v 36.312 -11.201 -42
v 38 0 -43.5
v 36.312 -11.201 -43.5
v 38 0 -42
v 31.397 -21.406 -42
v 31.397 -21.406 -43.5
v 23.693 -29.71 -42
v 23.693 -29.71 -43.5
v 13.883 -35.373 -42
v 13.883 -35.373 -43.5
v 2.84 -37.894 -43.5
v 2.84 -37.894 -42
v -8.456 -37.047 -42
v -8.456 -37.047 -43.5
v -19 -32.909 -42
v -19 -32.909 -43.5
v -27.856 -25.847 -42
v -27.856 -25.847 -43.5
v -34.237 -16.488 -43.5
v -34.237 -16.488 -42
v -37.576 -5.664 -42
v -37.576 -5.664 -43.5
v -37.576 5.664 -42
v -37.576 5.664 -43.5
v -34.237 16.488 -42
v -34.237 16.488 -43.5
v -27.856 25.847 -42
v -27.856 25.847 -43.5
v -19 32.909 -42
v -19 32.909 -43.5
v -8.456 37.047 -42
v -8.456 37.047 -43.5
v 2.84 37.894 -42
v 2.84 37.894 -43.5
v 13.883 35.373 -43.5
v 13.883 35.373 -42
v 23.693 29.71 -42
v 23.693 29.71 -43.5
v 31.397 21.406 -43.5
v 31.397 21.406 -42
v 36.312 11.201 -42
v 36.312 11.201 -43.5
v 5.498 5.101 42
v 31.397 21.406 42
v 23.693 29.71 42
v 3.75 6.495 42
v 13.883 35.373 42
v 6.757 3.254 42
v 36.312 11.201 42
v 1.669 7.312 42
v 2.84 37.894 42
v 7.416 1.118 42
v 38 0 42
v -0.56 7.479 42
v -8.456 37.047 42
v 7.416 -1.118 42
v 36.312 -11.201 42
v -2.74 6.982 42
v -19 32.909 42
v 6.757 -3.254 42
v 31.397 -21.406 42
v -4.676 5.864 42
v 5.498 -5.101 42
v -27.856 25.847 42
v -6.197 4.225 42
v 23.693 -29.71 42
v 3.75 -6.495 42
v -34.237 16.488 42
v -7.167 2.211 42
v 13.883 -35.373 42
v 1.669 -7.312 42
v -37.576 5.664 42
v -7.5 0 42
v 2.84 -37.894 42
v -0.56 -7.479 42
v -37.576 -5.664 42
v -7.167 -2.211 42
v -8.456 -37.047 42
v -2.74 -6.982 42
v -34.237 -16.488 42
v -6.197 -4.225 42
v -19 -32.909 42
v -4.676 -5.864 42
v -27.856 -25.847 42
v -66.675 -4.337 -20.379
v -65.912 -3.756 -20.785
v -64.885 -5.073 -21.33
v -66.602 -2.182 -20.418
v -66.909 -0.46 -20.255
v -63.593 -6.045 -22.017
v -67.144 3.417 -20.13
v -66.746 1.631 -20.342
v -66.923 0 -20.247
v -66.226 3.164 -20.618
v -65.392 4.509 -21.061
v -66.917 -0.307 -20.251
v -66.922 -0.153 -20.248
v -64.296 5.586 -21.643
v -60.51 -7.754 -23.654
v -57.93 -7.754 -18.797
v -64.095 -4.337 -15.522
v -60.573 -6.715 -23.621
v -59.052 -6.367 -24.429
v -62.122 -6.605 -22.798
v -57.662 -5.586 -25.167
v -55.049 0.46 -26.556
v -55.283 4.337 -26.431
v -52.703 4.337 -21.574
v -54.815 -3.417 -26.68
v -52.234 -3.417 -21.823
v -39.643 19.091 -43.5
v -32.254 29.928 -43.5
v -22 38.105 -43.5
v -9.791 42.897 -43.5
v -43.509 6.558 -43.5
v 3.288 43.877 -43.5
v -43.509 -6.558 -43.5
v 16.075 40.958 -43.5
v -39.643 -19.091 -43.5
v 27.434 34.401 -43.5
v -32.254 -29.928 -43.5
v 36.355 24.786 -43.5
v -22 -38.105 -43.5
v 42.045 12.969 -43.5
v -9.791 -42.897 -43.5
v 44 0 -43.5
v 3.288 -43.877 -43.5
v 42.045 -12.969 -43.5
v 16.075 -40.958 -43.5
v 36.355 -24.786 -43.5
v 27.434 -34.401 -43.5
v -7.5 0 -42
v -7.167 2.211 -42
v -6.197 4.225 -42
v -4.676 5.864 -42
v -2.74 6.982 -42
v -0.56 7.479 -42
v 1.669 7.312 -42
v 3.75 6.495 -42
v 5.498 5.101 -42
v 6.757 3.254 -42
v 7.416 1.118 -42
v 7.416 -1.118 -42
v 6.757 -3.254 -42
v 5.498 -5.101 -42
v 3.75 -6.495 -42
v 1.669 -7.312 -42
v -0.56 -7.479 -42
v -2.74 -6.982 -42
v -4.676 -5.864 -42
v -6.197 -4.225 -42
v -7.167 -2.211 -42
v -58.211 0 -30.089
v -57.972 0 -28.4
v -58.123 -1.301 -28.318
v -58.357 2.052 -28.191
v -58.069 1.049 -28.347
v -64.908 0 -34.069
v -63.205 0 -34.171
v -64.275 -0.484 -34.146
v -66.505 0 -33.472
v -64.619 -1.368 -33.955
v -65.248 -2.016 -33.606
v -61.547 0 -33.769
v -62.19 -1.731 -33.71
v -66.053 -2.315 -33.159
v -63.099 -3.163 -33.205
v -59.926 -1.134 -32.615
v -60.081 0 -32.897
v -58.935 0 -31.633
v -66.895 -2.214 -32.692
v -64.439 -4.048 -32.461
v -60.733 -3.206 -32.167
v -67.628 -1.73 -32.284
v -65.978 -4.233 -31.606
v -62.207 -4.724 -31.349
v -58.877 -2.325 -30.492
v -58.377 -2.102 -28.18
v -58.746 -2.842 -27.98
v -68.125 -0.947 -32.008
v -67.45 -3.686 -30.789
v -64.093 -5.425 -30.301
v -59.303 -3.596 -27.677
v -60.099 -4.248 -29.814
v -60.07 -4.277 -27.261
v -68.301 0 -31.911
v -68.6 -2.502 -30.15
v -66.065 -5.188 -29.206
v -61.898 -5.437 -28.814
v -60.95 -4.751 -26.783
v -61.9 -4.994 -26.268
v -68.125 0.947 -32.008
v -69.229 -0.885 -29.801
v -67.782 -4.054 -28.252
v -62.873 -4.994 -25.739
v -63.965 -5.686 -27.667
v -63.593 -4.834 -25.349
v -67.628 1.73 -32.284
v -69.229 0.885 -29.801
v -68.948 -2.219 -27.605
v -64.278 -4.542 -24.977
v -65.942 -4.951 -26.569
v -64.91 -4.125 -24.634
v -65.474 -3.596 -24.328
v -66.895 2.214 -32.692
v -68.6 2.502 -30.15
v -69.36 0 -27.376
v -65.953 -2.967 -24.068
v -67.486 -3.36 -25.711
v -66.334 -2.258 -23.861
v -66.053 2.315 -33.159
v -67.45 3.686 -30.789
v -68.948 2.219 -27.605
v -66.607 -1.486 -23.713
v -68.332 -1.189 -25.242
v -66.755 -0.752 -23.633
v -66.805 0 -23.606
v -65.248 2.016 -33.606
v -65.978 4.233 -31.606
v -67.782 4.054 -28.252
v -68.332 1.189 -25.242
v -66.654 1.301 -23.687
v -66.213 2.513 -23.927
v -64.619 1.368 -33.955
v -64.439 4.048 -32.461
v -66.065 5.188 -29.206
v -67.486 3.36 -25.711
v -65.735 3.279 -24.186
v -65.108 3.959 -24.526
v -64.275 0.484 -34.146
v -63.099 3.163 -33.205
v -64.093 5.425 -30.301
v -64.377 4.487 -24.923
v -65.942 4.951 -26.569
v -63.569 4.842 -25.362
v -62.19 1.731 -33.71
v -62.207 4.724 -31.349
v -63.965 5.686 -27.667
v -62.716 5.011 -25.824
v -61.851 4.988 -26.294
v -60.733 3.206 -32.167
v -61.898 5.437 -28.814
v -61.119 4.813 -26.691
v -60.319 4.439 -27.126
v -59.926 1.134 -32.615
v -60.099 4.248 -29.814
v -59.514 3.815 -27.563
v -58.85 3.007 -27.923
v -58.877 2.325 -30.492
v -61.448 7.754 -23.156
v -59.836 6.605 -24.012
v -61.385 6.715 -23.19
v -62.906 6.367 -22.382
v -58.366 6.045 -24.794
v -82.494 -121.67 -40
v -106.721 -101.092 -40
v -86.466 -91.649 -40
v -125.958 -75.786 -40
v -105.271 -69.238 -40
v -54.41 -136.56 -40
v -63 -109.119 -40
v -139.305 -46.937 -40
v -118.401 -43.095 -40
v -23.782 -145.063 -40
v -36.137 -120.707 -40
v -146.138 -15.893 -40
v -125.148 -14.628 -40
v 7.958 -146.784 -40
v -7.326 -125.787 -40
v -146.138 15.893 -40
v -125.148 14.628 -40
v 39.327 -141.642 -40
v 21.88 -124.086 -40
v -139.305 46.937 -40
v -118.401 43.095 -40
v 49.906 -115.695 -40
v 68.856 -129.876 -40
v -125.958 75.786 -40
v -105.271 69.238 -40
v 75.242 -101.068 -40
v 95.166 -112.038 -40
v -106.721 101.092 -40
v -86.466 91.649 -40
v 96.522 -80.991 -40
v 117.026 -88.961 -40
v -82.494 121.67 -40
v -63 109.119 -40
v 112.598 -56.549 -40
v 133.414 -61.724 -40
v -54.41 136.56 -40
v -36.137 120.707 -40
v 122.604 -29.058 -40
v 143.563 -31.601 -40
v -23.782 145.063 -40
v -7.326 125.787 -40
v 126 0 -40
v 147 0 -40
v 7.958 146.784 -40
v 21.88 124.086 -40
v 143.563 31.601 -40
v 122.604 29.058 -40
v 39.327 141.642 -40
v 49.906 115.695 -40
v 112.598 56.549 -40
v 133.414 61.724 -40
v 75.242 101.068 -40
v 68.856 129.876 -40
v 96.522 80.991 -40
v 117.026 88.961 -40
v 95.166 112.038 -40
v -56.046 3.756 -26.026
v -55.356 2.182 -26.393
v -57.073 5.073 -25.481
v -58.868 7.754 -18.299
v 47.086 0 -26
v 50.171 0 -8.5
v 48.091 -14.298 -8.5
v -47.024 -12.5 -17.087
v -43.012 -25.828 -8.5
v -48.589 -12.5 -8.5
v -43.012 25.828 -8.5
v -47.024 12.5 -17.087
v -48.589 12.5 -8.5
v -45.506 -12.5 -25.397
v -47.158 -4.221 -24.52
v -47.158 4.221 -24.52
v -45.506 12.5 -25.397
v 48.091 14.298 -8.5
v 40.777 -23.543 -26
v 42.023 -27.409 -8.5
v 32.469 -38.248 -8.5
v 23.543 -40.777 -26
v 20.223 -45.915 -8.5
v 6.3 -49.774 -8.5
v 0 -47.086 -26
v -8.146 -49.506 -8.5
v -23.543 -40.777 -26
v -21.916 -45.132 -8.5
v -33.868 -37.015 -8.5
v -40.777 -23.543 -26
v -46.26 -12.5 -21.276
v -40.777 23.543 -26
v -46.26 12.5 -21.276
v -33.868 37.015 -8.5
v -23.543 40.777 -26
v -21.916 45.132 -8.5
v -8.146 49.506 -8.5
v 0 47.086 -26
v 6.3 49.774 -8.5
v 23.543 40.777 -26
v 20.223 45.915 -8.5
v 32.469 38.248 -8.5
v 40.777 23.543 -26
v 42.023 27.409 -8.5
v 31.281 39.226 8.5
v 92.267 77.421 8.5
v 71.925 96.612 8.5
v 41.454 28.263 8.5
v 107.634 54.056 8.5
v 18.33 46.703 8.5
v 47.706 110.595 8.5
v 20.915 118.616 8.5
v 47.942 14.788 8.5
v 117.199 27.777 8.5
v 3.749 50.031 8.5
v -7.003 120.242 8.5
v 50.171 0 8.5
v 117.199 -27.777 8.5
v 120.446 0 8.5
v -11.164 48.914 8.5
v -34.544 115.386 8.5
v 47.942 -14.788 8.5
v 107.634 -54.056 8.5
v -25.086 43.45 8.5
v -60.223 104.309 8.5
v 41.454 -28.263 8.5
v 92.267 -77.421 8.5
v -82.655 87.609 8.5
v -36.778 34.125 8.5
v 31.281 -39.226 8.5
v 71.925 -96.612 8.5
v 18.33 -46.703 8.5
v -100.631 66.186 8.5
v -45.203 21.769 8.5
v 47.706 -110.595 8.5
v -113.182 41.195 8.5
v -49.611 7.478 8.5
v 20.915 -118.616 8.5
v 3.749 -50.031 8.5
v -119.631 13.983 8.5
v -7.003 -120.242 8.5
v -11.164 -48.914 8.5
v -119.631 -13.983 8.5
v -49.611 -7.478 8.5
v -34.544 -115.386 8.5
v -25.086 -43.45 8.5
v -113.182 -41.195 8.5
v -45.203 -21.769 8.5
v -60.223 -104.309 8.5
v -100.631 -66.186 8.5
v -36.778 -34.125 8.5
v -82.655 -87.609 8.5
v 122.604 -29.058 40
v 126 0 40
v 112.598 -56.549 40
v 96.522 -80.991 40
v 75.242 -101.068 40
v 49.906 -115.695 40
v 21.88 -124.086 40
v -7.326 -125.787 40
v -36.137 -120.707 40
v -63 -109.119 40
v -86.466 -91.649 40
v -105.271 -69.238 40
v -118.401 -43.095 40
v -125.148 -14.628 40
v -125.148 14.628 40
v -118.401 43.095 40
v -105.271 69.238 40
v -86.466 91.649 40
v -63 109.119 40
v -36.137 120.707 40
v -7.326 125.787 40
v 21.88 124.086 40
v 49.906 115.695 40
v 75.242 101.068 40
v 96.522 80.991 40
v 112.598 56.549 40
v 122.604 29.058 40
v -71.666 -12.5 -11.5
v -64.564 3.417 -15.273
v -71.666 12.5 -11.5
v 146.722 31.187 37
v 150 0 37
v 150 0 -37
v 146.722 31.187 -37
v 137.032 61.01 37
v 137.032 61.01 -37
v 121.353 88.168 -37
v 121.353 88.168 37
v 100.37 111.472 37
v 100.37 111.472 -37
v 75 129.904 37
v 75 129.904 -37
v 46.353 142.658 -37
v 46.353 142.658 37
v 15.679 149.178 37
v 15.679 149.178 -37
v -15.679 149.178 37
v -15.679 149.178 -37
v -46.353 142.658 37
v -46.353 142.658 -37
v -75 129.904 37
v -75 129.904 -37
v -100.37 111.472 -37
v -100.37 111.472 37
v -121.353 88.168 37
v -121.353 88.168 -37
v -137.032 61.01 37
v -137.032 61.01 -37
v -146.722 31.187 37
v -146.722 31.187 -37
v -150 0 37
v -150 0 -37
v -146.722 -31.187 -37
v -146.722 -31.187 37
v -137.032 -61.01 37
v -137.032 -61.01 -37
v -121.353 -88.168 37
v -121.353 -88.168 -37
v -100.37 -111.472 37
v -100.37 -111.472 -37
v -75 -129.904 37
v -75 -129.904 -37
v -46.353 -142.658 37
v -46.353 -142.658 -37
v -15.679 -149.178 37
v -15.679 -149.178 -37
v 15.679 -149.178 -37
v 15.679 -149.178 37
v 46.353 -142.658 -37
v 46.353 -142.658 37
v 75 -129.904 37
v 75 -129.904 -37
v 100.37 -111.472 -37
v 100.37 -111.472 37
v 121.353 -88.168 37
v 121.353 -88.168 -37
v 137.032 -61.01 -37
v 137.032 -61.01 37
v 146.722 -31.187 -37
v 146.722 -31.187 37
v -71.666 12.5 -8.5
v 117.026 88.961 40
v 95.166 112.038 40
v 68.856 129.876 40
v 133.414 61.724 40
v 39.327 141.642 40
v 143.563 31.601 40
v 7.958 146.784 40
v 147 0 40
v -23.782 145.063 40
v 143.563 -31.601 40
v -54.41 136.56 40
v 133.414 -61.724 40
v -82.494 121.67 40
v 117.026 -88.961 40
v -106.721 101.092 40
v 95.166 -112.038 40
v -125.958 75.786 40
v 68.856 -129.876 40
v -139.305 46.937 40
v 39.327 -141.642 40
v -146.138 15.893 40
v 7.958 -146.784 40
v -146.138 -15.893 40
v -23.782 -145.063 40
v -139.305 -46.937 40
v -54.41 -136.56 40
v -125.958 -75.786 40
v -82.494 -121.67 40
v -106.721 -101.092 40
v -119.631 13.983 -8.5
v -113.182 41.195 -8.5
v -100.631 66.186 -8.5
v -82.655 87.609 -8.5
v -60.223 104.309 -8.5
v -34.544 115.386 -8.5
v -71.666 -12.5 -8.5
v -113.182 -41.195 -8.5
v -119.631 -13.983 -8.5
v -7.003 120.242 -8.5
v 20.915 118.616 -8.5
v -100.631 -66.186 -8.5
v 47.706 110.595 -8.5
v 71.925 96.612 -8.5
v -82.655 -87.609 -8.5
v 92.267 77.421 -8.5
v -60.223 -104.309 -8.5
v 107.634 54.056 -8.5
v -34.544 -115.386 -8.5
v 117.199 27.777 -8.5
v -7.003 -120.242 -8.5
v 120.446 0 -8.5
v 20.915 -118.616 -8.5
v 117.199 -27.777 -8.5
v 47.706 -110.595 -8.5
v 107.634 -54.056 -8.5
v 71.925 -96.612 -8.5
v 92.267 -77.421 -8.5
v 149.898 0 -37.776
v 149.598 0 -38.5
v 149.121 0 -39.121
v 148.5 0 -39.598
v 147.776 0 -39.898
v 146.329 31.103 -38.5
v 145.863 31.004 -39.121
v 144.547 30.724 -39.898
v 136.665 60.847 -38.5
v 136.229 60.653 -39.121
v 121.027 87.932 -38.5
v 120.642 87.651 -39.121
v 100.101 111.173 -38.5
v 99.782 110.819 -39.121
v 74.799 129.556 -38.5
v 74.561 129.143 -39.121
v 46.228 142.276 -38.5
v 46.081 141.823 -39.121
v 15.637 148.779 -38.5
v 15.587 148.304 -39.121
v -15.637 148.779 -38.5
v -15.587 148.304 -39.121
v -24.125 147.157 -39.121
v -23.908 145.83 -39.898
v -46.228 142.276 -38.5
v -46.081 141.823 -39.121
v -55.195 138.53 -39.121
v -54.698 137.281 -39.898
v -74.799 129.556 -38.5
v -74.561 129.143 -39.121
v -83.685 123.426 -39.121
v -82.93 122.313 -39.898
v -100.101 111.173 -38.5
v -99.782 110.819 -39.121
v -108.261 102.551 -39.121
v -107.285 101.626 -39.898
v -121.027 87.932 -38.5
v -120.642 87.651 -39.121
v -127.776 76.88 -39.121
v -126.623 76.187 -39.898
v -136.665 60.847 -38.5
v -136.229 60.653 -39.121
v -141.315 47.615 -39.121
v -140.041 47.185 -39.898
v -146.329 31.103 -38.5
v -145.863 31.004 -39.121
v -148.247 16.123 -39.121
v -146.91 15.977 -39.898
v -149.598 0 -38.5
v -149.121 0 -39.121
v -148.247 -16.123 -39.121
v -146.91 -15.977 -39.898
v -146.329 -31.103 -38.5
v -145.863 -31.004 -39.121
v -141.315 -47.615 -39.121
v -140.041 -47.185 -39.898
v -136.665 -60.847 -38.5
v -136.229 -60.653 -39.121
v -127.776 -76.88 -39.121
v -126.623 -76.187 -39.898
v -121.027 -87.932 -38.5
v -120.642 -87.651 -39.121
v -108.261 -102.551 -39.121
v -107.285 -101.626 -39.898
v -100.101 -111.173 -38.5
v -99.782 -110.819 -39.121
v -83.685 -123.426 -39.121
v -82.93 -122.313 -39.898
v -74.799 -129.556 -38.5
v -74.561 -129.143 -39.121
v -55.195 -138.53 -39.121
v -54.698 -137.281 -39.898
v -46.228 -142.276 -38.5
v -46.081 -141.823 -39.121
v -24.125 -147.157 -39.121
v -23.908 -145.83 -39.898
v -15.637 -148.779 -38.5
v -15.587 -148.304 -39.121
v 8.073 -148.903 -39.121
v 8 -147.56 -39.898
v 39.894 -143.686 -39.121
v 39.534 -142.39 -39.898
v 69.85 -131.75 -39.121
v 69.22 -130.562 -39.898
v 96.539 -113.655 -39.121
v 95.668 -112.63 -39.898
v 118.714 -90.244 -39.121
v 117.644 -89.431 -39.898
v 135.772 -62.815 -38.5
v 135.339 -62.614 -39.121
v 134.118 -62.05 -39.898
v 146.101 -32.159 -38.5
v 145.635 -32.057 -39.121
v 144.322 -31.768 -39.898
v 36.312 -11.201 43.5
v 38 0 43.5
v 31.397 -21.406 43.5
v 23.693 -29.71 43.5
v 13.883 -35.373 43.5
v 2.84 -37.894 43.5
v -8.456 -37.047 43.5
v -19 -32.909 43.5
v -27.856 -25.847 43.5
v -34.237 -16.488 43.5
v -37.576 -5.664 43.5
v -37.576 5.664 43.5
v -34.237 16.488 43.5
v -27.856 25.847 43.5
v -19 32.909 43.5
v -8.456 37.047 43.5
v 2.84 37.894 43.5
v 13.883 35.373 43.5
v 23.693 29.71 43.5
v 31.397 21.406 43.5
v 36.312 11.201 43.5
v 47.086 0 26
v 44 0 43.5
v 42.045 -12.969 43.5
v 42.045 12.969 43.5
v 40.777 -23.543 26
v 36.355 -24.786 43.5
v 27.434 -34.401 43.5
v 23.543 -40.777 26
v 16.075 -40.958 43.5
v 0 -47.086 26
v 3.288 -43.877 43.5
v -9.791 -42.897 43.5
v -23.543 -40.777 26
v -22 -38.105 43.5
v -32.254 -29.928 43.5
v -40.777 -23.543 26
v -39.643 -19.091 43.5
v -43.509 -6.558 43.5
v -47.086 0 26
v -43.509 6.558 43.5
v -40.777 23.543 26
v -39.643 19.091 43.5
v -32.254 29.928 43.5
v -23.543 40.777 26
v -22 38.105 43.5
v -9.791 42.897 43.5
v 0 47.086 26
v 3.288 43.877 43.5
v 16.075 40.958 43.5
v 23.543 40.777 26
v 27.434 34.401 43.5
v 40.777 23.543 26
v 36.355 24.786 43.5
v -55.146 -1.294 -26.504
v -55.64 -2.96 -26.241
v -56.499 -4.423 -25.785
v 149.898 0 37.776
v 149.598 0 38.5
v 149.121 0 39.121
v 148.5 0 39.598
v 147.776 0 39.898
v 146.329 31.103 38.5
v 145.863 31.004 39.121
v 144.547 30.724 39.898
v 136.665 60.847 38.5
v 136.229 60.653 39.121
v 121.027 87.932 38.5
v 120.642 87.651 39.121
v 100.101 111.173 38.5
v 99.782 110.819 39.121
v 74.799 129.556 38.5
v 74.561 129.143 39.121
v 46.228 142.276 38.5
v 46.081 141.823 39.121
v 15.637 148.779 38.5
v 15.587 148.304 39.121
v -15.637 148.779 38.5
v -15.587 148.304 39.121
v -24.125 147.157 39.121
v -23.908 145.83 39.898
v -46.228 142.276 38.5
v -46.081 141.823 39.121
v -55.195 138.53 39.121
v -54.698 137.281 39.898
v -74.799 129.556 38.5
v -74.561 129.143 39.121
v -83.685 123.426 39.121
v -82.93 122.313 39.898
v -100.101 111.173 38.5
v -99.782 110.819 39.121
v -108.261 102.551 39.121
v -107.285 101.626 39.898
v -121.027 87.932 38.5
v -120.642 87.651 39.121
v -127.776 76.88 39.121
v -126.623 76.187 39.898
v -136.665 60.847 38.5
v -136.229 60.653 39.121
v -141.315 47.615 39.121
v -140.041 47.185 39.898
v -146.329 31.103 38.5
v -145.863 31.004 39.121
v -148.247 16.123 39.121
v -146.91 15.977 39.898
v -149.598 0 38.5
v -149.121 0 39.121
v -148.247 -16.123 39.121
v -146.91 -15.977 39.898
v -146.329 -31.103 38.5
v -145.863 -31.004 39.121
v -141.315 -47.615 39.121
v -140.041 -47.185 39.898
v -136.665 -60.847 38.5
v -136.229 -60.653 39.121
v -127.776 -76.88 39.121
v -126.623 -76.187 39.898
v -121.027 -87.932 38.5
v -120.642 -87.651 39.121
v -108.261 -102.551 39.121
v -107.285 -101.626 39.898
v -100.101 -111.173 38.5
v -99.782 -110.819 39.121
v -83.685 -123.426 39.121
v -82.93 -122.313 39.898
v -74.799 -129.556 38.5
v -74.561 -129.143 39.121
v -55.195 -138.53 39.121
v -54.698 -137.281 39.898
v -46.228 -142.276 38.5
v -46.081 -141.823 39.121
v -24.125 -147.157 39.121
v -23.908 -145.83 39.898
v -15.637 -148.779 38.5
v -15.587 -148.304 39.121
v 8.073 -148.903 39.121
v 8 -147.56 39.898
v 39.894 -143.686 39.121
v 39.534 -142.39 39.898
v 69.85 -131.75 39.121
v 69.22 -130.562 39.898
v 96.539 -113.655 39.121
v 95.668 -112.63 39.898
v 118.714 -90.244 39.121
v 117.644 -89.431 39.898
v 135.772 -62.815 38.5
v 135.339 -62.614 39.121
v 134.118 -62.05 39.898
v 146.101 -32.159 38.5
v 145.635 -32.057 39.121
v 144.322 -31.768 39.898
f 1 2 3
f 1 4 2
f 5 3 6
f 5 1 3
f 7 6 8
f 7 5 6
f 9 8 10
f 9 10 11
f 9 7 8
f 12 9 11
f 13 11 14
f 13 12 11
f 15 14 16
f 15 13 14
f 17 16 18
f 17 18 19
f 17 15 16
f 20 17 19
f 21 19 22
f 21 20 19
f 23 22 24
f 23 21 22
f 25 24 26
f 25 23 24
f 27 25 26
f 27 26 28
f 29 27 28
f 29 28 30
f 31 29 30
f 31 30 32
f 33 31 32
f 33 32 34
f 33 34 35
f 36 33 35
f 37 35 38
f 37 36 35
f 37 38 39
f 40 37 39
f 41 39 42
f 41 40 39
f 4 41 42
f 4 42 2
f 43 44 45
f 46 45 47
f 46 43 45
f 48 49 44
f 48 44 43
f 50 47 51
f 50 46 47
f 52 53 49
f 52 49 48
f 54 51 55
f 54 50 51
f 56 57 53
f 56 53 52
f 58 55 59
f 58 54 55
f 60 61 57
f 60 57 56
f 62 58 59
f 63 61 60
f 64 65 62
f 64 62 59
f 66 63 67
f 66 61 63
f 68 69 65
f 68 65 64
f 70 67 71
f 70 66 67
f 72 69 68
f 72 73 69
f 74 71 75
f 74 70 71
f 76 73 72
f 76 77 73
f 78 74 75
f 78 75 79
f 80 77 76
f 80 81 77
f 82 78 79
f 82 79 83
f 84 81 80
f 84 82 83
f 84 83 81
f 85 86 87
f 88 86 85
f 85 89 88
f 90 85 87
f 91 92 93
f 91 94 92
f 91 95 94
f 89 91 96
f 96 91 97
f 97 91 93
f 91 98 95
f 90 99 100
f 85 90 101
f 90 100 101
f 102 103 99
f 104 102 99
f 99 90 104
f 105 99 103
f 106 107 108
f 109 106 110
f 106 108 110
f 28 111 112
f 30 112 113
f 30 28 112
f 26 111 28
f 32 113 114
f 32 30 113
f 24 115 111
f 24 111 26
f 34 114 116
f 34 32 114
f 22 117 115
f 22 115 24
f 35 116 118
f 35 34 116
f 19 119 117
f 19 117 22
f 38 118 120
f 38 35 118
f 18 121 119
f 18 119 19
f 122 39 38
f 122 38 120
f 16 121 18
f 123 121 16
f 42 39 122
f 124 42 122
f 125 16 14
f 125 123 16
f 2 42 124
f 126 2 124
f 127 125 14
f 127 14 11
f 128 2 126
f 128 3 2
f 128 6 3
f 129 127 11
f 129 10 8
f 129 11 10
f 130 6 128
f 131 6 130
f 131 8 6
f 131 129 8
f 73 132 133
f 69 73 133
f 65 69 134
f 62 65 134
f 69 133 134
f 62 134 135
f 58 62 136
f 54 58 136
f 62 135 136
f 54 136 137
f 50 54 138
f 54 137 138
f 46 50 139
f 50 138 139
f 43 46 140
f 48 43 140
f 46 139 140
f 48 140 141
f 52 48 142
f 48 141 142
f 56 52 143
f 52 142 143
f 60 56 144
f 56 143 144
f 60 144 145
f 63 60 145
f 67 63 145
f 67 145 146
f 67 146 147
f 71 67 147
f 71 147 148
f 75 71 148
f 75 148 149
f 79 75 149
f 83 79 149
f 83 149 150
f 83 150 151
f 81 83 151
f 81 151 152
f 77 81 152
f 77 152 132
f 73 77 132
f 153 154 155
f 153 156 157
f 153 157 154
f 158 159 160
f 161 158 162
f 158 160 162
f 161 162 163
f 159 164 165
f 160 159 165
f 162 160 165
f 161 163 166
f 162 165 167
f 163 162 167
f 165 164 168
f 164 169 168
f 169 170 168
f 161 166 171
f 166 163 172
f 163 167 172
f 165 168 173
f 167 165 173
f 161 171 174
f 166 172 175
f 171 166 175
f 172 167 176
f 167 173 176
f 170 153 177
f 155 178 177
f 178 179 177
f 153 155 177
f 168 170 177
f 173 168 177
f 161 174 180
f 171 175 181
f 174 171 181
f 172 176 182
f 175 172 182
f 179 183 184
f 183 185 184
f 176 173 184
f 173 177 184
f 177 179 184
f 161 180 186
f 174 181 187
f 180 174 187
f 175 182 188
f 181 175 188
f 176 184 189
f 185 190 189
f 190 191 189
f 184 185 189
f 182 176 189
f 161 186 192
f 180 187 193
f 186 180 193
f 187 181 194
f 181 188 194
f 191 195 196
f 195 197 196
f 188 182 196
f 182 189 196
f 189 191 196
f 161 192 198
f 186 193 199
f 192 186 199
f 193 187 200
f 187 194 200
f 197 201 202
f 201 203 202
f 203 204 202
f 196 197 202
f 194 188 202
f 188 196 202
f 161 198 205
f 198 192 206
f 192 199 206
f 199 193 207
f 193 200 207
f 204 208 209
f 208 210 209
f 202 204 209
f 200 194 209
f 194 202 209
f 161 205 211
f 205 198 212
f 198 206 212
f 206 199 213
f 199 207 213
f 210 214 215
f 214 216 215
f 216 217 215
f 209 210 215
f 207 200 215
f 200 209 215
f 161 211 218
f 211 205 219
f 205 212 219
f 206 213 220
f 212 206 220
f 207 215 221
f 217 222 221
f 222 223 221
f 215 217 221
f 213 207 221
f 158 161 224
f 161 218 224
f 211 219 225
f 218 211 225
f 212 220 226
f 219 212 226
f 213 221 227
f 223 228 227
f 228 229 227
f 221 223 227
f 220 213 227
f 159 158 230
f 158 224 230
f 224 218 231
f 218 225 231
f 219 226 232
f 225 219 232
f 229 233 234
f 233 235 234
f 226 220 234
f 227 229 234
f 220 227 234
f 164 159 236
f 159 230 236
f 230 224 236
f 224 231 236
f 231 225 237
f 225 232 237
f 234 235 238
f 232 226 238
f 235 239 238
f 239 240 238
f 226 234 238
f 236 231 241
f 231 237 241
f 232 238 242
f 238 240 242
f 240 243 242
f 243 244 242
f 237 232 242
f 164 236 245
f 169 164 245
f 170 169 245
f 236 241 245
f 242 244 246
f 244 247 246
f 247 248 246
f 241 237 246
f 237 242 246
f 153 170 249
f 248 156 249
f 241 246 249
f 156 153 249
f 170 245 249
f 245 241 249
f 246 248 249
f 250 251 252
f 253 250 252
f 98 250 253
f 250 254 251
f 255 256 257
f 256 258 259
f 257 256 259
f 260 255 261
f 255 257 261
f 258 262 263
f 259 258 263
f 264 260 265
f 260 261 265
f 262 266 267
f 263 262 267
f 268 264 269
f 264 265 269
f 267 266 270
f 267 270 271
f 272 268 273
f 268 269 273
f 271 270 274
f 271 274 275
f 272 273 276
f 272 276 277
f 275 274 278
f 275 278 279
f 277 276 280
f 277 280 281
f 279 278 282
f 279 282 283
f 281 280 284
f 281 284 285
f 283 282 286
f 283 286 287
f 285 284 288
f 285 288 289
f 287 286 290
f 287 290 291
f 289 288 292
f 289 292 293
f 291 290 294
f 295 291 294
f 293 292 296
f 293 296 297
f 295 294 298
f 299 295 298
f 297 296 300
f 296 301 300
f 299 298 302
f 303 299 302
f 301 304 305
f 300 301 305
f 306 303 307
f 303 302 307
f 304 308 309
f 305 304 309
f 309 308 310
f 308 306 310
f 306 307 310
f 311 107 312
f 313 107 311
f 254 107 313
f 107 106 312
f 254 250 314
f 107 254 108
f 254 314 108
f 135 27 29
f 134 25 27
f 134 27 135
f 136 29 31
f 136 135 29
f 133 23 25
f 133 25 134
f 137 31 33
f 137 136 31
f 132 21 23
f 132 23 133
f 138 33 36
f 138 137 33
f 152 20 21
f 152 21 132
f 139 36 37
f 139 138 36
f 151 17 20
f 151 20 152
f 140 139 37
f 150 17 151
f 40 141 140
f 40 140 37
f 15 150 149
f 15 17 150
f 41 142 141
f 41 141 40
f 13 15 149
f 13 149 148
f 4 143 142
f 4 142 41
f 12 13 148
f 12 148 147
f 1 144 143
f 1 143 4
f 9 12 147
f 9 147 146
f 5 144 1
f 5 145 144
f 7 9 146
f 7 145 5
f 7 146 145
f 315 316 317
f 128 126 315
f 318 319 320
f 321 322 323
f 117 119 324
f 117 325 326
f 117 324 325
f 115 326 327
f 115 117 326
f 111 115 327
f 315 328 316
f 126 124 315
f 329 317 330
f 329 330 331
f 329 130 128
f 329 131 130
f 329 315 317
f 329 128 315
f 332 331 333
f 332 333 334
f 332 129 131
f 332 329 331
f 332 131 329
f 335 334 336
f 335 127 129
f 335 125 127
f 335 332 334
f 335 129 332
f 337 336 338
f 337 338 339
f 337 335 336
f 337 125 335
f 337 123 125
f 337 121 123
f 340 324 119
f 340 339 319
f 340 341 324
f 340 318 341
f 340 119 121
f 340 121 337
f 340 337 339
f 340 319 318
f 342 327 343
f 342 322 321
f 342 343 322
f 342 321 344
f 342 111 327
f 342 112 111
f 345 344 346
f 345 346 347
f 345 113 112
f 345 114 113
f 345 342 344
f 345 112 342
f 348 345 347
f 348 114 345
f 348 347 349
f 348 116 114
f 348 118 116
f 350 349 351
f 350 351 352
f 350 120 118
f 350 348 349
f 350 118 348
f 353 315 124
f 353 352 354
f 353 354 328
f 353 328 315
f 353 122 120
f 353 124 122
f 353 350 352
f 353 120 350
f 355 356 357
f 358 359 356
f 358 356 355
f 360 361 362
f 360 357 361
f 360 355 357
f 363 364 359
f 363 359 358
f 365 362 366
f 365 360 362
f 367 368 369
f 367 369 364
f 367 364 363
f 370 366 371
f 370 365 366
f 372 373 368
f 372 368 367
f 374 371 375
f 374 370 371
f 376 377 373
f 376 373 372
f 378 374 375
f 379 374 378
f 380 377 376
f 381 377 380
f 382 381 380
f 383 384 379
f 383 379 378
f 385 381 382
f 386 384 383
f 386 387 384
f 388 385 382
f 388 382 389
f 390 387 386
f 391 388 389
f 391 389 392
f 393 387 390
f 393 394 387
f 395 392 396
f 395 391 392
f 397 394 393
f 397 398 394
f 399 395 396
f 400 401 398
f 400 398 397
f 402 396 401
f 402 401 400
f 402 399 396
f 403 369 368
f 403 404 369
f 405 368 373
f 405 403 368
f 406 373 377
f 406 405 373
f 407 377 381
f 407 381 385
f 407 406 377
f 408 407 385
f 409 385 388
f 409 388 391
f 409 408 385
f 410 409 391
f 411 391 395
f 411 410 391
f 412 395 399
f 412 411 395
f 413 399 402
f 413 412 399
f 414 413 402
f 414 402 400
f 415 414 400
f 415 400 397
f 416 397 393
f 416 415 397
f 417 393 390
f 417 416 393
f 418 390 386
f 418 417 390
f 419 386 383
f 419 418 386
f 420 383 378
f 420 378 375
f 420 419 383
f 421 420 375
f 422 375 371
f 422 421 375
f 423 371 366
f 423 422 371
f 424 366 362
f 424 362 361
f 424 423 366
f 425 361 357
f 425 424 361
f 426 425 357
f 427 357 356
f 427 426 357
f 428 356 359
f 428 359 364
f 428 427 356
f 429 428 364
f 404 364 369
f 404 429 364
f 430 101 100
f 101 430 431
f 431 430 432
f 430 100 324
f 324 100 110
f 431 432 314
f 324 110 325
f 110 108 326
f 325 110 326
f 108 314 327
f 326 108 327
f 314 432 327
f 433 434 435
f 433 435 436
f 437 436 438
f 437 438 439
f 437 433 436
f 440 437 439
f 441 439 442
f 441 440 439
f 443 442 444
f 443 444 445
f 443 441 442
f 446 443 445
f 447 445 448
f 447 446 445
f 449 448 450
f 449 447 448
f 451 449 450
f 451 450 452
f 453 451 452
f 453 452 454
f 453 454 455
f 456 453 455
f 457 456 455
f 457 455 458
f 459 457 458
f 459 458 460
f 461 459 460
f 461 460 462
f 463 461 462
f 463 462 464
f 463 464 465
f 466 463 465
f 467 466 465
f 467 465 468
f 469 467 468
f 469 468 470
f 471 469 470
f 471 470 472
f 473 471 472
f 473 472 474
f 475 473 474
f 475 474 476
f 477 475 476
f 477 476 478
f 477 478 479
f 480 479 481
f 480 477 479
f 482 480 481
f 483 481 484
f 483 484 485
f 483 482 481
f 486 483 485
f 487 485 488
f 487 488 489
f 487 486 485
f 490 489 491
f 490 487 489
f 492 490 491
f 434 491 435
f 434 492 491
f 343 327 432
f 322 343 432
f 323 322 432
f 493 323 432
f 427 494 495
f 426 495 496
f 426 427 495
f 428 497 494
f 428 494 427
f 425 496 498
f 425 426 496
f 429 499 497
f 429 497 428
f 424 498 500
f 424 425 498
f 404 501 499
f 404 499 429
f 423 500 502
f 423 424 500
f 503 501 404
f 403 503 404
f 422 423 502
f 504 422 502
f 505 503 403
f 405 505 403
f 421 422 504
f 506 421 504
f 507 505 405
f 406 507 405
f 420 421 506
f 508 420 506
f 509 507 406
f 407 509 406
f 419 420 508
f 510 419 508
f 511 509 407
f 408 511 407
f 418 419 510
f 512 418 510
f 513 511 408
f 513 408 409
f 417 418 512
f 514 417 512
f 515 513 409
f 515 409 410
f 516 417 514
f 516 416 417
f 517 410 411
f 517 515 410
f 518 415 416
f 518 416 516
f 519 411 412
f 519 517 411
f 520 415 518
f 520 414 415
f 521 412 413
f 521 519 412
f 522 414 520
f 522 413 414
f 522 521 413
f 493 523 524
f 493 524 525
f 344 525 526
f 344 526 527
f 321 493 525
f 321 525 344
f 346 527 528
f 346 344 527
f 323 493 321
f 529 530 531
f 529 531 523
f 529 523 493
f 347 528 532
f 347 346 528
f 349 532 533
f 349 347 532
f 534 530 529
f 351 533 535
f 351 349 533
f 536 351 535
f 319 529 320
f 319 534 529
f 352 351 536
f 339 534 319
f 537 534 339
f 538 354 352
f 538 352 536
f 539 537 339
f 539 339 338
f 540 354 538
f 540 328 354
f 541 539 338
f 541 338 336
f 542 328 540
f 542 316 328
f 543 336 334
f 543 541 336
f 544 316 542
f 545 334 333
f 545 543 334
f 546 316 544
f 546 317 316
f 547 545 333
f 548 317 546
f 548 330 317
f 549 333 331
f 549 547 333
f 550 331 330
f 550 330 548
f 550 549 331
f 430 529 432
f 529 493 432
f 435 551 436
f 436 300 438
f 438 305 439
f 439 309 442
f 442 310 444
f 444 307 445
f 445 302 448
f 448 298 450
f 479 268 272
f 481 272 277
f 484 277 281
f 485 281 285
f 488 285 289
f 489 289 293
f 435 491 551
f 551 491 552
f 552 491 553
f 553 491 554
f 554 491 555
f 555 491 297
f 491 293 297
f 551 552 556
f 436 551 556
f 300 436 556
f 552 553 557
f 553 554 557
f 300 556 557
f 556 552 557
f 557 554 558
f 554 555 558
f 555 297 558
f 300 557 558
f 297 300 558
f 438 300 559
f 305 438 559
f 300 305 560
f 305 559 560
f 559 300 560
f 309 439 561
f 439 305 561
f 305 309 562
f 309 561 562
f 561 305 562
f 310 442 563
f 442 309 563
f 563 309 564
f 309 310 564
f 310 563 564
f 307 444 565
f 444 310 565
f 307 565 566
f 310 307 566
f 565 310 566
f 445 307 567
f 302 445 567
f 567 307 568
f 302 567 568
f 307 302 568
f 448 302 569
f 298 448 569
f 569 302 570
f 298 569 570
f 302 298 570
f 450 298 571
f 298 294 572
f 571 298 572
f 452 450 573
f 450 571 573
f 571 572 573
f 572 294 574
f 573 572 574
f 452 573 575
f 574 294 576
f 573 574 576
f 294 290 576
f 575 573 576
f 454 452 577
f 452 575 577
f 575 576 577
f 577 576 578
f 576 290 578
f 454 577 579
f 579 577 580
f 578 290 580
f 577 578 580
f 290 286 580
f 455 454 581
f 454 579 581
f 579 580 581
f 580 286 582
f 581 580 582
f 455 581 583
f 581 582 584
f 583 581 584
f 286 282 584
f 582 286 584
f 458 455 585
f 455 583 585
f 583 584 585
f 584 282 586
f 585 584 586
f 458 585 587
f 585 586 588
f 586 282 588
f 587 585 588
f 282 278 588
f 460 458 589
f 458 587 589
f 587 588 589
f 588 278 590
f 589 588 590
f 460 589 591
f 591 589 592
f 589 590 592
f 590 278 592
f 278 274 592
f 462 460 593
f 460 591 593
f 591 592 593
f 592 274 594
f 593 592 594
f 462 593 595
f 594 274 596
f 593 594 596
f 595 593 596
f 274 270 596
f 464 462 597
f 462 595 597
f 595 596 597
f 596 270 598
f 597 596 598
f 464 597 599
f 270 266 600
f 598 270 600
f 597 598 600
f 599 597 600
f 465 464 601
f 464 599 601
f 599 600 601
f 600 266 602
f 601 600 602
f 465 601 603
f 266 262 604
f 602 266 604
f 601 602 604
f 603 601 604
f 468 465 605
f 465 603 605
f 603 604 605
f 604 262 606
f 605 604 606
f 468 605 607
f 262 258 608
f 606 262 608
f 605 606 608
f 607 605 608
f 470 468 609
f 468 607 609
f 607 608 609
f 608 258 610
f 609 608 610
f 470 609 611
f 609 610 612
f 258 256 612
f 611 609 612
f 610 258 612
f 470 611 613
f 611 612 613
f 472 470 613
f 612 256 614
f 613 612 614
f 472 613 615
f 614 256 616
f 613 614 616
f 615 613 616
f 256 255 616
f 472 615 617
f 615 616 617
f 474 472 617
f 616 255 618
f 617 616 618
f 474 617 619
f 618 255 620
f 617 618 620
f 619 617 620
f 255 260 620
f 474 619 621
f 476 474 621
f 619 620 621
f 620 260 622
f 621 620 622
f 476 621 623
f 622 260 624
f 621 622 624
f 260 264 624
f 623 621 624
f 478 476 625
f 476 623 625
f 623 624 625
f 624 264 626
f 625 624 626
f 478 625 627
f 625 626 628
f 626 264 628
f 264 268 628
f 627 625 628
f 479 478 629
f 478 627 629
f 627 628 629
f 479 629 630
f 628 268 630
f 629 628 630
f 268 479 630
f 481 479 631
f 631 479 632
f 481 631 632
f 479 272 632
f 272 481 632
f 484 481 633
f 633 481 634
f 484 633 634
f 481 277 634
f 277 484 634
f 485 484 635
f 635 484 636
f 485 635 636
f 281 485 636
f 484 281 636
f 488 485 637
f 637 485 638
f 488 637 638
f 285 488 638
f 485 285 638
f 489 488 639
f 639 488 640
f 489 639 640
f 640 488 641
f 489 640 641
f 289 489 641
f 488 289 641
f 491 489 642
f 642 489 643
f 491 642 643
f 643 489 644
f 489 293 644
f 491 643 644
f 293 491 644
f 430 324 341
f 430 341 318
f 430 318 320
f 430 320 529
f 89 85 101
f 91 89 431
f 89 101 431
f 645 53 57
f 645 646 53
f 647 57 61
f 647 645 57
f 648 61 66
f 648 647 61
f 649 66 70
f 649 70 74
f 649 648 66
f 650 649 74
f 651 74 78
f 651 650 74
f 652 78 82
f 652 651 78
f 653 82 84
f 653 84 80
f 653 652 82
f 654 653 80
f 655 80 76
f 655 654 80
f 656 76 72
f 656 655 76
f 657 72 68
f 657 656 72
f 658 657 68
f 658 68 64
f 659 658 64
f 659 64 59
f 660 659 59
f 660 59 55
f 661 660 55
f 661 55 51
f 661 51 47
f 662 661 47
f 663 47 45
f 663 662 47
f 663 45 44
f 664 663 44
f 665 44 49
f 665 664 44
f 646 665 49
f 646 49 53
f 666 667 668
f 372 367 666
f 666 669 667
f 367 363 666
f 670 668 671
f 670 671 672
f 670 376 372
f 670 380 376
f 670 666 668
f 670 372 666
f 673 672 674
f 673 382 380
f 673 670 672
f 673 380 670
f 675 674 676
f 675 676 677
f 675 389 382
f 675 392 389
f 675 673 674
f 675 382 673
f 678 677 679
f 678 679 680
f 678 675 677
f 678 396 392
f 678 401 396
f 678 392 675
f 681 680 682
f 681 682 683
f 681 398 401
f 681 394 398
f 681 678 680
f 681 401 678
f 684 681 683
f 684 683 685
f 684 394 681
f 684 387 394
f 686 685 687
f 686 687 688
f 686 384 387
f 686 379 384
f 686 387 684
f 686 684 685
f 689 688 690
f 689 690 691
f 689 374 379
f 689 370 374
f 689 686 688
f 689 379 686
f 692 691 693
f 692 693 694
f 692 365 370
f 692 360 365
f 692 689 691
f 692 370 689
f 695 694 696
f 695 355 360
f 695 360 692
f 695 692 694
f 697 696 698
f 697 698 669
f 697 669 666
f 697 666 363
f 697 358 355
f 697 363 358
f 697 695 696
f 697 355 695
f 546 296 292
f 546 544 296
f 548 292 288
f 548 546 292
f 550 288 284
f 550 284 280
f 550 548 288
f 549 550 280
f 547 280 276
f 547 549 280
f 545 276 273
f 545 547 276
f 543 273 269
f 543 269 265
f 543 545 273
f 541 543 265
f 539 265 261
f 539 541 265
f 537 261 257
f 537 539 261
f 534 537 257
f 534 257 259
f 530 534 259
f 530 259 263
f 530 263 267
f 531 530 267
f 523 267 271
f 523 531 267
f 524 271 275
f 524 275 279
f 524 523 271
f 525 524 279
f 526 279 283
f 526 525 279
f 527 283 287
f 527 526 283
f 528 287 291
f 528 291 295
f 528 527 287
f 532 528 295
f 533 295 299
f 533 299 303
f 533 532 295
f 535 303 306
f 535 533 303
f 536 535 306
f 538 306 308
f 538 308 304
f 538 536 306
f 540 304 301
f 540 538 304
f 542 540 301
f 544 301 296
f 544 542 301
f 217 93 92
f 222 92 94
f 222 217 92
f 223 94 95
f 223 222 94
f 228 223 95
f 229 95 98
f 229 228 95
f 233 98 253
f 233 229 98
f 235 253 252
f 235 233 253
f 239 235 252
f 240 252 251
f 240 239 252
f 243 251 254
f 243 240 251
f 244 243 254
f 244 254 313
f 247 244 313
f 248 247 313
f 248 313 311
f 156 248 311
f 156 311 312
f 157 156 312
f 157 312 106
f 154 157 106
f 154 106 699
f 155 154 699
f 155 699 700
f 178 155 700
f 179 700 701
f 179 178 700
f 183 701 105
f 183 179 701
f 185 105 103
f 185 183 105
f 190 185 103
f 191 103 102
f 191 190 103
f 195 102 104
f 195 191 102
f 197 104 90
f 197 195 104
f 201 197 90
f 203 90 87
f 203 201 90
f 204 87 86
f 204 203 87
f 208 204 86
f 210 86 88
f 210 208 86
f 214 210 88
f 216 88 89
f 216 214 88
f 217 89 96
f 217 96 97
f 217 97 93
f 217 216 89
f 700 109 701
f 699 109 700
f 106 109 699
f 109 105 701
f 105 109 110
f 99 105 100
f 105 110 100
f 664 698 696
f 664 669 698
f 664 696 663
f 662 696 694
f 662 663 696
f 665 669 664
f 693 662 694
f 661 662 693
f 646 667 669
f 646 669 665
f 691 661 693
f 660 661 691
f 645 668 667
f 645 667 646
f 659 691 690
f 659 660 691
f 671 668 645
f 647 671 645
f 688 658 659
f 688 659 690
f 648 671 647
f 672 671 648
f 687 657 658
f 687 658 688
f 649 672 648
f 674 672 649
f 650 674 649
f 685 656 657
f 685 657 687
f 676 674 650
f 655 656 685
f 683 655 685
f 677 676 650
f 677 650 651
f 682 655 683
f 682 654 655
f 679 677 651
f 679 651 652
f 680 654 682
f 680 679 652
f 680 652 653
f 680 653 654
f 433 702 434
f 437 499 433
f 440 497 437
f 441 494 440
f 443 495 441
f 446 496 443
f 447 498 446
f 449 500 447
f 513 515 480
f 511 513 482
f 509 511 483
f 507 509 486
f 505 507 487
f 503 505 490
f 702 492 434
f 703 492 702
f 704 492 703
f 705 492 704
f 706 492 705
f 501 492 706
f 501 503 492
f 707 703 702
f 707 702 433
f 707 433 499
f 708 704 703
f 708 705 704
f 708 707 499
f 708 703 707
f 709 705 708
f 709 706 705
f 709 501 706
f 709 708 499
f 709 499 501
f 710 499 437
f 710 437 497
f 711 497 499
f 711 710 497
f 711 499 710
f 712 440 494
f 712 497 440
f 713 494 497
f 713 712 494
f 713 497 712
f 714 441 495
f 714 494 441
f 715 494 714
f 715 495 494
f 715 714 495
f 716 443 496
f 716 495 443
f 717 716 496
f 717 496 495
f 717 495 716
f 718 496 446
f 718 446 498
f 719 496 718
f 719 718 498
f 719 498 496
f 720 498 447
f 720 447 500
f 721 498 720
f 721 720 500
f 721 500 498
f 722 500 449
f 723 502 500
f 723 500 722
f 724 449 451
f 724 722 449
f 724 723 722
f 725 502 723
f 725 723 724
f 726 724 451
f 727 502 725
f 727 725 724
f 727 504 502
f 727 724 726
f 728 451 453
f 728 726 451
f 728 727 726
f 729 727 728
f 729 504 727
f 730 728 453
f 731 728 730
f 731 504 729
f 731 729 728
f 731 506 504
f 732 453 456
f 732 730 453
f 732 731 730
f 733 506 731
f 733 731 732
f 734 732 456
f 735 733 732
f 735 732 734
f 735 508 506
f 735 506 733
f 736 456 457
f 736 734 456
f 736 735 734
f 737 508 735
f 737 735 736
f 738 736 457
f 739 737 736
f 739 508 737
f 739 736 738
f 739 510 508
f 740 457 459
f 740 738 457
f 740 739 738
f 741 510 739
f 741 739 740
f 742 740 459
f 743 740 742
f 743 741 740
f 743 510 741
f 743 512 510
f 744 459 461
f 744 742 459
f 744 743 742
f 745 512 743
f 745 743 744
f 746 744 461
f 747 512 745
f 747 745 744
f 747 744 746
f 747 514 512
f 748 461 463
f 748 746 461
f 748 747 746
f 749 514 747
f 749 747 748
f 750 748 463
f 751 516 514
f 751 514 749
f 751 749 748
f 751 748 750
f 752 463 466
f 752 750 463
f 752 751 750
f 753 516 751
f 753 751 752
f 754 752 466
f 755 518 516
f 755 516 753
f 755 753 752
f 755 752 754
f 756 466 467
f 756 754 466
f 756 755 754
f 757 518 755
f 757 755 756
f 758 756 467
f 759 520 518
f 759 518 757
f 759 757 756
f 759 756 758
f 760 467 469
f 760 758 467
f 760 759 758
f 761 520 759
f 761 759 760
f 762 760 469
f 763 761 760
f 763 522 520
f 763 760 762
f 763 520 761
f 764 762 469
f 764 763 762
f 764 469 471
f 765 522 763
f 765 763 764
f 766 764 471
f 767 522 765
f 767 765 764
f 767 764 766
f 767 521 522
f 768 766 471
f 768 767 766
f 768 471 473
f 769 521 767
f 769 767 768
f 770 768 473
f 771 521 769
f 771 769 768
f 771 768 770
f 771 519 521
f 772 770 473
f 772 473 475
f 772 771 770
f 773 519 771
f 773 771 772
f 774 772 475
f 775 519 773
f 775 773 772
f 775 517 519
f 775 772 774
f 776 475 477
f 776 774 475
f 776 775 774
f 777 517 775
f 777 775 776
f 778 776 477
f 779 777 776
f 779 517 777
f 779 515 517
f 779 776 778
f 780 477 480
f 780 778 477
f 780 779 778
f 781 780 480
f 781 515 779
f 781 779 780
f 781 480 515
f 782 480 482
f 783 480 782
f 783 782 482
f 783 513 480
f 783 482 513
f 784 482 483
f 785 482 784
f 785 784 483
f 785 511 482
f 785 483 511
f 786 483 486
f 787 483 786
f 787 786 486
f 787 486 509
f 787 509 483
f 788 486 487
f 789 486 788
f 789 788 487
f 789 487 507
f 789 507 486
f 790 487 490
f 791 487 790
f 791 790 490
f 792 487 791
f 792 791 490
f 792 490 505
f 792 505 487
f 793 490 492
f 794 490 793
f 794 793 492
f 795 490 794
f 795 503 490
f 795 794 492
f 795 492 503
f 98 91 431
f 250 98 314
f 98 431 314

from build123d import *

# Parameters (mm, degrees)
SKETCH1_R           = 150
SKETCH1_R_2         = 138
BOSS_EXTRUDE1_DEPTH = 40
FILLET1_R           = 3
BOSS_EXTRUDE2_DEPTH = 12.5
BOSS_EXTRUDE3_DEPTH = 5.5
SKETCH6_R           = 6.730891085
BOSS_EXTRUDE4_DEPTH = 3
BOSS_EXTRUDE4_TAPER = 30
SKETCH8_R           = 7.5
CUT_EXTRUDE1_DEPTH  = 229.714341483


with BuildPart() as part:
    # Sketch1 → Boss-Extrude1 (new, symmetric)
    with BuildSketch(Plane.XY):
        Circle(SKETCH1_R)
        Circle(SKETCH1_R_2, mode=Mode.SUBTRACT)
    extrude(amount=BOSS_EXTRUDE1_DEPTH, both=True)

    # Fillet1
    fillet1_edges = [part.edges().sort_by_distance(p)[0] for p in [
        (-150, 0, -40),
        (-150, 0, 40),
    ]]
    fillet(fillet1_edges, radius=FILLET1_R)



with BuildPart() as body_2:
    # Sketch2 → Revolve1 (revolve)
    with BuildSketch(Plane(origin=(0, 0, 0), x_dir=(1, 0, 0), z_dir=(0, 1, 0)), mode=Mode.PRIVATE) as revolve1_sk:
        Polygon((0, 42), (0, -42), (-38, -42), (-38, -43.5), (-44, -43.5), (-50.171444325, -8.5), (-120.445700108, -8.5), (-126, -40), (-138, -40), (-138, 40), (-126, 40), (-120.445700108, 8.5), (-50.171444325, 8.5), (-44, 43.5), (-38, 43.5), (-38, 42), align=None)
    revolve(revolve1_sk.sketch.rotate(Axis((0, 0, 0), (0, 0, -1)), 180), axis=Axis((0, 0, 0), (0, 0, -1)))


with BuildPart() as part_1:
    add(part.part)

    add(body_2.part)  # Boss-Extrude2 merges body 2
    # Sketch4 → Boss-Extrude2 (add, symmetric)
    with BuildSketch(Plane(origin=(0, 0, 0), x_dir=(1, 0, 0), z_dir=(0, 1, 0))):
        Polygon((-36.665910449, 28.5), (-36.665910449, 8.5), (-71.665910449, 8.5), (-71.665910449, 11.5), (-39.665910449, 28.5), align=None)
    extrude(amount=BOSS_EXTRUDE2_DEPTH, both=True)

    # Sketch5 → Boss-Extrude3 (add)
    with BuildSketch(Plane(origin=(-20.538802833, 0, -38.661275921), x_dir=(-0.8831157194574106, 0, 0.46915522596174936), z_dir=(-0.4691552259617493, 0, -0.8831157194574105))):
        Polygon((49.851566833, 3.4173178), (43.40179394, 7.754016548), (36.42121621, 4.336698747), (35.890411372, -3.4173178), (42.340184265, -7.754016548), (49.320761995, -4.336698747), align=None)
    extrude(amount=BOSS_EXTRUDE3_DEPTH)

    # Sketch6 → Boss-Extrude4 (add)
    with BuildSketch(Plane(origin=(-23.119156576, 0, -43.518412378), x_dir=(-0.8831157194574103, 0, 0.4691552259617501), z_dir=(-0.4691552259617501, 0, -0.8831157194574103))):
        with Locations((42.870989102, 0)):
            Circle(SKETCH6_R)
    extrude(amount=BOSS_EXTRUDE4_DEPTH, taper=BOSS_EXTRUDE4_TAPER)

    # Sketch7 → Revolve3 (revolve)
    with BuildSketch(Plane(origin=(0, 0, 0), x_dir=(1, 0, 0), z_dir=(0, 1, 0))):
        with BuildLine():
            ThreePointArc((-66.505399661, 33.471675934), (-60.781448215, 33.38765917), (-57.972112211, 28.399842997))
            Line((-57.972112211, 28.399842997), (-62.386666639, 26.054610957))
            Line((-62.386666639, 26.054610957), (-66.505399661, 33.471675934))
        make_face()
    revolve(axis=Axis((-62.386666639, 0, -26.054610957), (-0.4854755142964054, 0, -0.8742502645230602)))

    # Sketch8 → Cut-Extrude1 (cut, through all)
    with BuildSketch(Plane(origin=(0, 0, -42), x_dir=(-1, 0, 0), z_dir=(0, 0, -1))):
        Circle(SKETCH8_R)
    extrude(amount=-CUT_EXTRUDE1_DEPTH, mode=Mode.SUBTRACT)


solid = part_1.part
